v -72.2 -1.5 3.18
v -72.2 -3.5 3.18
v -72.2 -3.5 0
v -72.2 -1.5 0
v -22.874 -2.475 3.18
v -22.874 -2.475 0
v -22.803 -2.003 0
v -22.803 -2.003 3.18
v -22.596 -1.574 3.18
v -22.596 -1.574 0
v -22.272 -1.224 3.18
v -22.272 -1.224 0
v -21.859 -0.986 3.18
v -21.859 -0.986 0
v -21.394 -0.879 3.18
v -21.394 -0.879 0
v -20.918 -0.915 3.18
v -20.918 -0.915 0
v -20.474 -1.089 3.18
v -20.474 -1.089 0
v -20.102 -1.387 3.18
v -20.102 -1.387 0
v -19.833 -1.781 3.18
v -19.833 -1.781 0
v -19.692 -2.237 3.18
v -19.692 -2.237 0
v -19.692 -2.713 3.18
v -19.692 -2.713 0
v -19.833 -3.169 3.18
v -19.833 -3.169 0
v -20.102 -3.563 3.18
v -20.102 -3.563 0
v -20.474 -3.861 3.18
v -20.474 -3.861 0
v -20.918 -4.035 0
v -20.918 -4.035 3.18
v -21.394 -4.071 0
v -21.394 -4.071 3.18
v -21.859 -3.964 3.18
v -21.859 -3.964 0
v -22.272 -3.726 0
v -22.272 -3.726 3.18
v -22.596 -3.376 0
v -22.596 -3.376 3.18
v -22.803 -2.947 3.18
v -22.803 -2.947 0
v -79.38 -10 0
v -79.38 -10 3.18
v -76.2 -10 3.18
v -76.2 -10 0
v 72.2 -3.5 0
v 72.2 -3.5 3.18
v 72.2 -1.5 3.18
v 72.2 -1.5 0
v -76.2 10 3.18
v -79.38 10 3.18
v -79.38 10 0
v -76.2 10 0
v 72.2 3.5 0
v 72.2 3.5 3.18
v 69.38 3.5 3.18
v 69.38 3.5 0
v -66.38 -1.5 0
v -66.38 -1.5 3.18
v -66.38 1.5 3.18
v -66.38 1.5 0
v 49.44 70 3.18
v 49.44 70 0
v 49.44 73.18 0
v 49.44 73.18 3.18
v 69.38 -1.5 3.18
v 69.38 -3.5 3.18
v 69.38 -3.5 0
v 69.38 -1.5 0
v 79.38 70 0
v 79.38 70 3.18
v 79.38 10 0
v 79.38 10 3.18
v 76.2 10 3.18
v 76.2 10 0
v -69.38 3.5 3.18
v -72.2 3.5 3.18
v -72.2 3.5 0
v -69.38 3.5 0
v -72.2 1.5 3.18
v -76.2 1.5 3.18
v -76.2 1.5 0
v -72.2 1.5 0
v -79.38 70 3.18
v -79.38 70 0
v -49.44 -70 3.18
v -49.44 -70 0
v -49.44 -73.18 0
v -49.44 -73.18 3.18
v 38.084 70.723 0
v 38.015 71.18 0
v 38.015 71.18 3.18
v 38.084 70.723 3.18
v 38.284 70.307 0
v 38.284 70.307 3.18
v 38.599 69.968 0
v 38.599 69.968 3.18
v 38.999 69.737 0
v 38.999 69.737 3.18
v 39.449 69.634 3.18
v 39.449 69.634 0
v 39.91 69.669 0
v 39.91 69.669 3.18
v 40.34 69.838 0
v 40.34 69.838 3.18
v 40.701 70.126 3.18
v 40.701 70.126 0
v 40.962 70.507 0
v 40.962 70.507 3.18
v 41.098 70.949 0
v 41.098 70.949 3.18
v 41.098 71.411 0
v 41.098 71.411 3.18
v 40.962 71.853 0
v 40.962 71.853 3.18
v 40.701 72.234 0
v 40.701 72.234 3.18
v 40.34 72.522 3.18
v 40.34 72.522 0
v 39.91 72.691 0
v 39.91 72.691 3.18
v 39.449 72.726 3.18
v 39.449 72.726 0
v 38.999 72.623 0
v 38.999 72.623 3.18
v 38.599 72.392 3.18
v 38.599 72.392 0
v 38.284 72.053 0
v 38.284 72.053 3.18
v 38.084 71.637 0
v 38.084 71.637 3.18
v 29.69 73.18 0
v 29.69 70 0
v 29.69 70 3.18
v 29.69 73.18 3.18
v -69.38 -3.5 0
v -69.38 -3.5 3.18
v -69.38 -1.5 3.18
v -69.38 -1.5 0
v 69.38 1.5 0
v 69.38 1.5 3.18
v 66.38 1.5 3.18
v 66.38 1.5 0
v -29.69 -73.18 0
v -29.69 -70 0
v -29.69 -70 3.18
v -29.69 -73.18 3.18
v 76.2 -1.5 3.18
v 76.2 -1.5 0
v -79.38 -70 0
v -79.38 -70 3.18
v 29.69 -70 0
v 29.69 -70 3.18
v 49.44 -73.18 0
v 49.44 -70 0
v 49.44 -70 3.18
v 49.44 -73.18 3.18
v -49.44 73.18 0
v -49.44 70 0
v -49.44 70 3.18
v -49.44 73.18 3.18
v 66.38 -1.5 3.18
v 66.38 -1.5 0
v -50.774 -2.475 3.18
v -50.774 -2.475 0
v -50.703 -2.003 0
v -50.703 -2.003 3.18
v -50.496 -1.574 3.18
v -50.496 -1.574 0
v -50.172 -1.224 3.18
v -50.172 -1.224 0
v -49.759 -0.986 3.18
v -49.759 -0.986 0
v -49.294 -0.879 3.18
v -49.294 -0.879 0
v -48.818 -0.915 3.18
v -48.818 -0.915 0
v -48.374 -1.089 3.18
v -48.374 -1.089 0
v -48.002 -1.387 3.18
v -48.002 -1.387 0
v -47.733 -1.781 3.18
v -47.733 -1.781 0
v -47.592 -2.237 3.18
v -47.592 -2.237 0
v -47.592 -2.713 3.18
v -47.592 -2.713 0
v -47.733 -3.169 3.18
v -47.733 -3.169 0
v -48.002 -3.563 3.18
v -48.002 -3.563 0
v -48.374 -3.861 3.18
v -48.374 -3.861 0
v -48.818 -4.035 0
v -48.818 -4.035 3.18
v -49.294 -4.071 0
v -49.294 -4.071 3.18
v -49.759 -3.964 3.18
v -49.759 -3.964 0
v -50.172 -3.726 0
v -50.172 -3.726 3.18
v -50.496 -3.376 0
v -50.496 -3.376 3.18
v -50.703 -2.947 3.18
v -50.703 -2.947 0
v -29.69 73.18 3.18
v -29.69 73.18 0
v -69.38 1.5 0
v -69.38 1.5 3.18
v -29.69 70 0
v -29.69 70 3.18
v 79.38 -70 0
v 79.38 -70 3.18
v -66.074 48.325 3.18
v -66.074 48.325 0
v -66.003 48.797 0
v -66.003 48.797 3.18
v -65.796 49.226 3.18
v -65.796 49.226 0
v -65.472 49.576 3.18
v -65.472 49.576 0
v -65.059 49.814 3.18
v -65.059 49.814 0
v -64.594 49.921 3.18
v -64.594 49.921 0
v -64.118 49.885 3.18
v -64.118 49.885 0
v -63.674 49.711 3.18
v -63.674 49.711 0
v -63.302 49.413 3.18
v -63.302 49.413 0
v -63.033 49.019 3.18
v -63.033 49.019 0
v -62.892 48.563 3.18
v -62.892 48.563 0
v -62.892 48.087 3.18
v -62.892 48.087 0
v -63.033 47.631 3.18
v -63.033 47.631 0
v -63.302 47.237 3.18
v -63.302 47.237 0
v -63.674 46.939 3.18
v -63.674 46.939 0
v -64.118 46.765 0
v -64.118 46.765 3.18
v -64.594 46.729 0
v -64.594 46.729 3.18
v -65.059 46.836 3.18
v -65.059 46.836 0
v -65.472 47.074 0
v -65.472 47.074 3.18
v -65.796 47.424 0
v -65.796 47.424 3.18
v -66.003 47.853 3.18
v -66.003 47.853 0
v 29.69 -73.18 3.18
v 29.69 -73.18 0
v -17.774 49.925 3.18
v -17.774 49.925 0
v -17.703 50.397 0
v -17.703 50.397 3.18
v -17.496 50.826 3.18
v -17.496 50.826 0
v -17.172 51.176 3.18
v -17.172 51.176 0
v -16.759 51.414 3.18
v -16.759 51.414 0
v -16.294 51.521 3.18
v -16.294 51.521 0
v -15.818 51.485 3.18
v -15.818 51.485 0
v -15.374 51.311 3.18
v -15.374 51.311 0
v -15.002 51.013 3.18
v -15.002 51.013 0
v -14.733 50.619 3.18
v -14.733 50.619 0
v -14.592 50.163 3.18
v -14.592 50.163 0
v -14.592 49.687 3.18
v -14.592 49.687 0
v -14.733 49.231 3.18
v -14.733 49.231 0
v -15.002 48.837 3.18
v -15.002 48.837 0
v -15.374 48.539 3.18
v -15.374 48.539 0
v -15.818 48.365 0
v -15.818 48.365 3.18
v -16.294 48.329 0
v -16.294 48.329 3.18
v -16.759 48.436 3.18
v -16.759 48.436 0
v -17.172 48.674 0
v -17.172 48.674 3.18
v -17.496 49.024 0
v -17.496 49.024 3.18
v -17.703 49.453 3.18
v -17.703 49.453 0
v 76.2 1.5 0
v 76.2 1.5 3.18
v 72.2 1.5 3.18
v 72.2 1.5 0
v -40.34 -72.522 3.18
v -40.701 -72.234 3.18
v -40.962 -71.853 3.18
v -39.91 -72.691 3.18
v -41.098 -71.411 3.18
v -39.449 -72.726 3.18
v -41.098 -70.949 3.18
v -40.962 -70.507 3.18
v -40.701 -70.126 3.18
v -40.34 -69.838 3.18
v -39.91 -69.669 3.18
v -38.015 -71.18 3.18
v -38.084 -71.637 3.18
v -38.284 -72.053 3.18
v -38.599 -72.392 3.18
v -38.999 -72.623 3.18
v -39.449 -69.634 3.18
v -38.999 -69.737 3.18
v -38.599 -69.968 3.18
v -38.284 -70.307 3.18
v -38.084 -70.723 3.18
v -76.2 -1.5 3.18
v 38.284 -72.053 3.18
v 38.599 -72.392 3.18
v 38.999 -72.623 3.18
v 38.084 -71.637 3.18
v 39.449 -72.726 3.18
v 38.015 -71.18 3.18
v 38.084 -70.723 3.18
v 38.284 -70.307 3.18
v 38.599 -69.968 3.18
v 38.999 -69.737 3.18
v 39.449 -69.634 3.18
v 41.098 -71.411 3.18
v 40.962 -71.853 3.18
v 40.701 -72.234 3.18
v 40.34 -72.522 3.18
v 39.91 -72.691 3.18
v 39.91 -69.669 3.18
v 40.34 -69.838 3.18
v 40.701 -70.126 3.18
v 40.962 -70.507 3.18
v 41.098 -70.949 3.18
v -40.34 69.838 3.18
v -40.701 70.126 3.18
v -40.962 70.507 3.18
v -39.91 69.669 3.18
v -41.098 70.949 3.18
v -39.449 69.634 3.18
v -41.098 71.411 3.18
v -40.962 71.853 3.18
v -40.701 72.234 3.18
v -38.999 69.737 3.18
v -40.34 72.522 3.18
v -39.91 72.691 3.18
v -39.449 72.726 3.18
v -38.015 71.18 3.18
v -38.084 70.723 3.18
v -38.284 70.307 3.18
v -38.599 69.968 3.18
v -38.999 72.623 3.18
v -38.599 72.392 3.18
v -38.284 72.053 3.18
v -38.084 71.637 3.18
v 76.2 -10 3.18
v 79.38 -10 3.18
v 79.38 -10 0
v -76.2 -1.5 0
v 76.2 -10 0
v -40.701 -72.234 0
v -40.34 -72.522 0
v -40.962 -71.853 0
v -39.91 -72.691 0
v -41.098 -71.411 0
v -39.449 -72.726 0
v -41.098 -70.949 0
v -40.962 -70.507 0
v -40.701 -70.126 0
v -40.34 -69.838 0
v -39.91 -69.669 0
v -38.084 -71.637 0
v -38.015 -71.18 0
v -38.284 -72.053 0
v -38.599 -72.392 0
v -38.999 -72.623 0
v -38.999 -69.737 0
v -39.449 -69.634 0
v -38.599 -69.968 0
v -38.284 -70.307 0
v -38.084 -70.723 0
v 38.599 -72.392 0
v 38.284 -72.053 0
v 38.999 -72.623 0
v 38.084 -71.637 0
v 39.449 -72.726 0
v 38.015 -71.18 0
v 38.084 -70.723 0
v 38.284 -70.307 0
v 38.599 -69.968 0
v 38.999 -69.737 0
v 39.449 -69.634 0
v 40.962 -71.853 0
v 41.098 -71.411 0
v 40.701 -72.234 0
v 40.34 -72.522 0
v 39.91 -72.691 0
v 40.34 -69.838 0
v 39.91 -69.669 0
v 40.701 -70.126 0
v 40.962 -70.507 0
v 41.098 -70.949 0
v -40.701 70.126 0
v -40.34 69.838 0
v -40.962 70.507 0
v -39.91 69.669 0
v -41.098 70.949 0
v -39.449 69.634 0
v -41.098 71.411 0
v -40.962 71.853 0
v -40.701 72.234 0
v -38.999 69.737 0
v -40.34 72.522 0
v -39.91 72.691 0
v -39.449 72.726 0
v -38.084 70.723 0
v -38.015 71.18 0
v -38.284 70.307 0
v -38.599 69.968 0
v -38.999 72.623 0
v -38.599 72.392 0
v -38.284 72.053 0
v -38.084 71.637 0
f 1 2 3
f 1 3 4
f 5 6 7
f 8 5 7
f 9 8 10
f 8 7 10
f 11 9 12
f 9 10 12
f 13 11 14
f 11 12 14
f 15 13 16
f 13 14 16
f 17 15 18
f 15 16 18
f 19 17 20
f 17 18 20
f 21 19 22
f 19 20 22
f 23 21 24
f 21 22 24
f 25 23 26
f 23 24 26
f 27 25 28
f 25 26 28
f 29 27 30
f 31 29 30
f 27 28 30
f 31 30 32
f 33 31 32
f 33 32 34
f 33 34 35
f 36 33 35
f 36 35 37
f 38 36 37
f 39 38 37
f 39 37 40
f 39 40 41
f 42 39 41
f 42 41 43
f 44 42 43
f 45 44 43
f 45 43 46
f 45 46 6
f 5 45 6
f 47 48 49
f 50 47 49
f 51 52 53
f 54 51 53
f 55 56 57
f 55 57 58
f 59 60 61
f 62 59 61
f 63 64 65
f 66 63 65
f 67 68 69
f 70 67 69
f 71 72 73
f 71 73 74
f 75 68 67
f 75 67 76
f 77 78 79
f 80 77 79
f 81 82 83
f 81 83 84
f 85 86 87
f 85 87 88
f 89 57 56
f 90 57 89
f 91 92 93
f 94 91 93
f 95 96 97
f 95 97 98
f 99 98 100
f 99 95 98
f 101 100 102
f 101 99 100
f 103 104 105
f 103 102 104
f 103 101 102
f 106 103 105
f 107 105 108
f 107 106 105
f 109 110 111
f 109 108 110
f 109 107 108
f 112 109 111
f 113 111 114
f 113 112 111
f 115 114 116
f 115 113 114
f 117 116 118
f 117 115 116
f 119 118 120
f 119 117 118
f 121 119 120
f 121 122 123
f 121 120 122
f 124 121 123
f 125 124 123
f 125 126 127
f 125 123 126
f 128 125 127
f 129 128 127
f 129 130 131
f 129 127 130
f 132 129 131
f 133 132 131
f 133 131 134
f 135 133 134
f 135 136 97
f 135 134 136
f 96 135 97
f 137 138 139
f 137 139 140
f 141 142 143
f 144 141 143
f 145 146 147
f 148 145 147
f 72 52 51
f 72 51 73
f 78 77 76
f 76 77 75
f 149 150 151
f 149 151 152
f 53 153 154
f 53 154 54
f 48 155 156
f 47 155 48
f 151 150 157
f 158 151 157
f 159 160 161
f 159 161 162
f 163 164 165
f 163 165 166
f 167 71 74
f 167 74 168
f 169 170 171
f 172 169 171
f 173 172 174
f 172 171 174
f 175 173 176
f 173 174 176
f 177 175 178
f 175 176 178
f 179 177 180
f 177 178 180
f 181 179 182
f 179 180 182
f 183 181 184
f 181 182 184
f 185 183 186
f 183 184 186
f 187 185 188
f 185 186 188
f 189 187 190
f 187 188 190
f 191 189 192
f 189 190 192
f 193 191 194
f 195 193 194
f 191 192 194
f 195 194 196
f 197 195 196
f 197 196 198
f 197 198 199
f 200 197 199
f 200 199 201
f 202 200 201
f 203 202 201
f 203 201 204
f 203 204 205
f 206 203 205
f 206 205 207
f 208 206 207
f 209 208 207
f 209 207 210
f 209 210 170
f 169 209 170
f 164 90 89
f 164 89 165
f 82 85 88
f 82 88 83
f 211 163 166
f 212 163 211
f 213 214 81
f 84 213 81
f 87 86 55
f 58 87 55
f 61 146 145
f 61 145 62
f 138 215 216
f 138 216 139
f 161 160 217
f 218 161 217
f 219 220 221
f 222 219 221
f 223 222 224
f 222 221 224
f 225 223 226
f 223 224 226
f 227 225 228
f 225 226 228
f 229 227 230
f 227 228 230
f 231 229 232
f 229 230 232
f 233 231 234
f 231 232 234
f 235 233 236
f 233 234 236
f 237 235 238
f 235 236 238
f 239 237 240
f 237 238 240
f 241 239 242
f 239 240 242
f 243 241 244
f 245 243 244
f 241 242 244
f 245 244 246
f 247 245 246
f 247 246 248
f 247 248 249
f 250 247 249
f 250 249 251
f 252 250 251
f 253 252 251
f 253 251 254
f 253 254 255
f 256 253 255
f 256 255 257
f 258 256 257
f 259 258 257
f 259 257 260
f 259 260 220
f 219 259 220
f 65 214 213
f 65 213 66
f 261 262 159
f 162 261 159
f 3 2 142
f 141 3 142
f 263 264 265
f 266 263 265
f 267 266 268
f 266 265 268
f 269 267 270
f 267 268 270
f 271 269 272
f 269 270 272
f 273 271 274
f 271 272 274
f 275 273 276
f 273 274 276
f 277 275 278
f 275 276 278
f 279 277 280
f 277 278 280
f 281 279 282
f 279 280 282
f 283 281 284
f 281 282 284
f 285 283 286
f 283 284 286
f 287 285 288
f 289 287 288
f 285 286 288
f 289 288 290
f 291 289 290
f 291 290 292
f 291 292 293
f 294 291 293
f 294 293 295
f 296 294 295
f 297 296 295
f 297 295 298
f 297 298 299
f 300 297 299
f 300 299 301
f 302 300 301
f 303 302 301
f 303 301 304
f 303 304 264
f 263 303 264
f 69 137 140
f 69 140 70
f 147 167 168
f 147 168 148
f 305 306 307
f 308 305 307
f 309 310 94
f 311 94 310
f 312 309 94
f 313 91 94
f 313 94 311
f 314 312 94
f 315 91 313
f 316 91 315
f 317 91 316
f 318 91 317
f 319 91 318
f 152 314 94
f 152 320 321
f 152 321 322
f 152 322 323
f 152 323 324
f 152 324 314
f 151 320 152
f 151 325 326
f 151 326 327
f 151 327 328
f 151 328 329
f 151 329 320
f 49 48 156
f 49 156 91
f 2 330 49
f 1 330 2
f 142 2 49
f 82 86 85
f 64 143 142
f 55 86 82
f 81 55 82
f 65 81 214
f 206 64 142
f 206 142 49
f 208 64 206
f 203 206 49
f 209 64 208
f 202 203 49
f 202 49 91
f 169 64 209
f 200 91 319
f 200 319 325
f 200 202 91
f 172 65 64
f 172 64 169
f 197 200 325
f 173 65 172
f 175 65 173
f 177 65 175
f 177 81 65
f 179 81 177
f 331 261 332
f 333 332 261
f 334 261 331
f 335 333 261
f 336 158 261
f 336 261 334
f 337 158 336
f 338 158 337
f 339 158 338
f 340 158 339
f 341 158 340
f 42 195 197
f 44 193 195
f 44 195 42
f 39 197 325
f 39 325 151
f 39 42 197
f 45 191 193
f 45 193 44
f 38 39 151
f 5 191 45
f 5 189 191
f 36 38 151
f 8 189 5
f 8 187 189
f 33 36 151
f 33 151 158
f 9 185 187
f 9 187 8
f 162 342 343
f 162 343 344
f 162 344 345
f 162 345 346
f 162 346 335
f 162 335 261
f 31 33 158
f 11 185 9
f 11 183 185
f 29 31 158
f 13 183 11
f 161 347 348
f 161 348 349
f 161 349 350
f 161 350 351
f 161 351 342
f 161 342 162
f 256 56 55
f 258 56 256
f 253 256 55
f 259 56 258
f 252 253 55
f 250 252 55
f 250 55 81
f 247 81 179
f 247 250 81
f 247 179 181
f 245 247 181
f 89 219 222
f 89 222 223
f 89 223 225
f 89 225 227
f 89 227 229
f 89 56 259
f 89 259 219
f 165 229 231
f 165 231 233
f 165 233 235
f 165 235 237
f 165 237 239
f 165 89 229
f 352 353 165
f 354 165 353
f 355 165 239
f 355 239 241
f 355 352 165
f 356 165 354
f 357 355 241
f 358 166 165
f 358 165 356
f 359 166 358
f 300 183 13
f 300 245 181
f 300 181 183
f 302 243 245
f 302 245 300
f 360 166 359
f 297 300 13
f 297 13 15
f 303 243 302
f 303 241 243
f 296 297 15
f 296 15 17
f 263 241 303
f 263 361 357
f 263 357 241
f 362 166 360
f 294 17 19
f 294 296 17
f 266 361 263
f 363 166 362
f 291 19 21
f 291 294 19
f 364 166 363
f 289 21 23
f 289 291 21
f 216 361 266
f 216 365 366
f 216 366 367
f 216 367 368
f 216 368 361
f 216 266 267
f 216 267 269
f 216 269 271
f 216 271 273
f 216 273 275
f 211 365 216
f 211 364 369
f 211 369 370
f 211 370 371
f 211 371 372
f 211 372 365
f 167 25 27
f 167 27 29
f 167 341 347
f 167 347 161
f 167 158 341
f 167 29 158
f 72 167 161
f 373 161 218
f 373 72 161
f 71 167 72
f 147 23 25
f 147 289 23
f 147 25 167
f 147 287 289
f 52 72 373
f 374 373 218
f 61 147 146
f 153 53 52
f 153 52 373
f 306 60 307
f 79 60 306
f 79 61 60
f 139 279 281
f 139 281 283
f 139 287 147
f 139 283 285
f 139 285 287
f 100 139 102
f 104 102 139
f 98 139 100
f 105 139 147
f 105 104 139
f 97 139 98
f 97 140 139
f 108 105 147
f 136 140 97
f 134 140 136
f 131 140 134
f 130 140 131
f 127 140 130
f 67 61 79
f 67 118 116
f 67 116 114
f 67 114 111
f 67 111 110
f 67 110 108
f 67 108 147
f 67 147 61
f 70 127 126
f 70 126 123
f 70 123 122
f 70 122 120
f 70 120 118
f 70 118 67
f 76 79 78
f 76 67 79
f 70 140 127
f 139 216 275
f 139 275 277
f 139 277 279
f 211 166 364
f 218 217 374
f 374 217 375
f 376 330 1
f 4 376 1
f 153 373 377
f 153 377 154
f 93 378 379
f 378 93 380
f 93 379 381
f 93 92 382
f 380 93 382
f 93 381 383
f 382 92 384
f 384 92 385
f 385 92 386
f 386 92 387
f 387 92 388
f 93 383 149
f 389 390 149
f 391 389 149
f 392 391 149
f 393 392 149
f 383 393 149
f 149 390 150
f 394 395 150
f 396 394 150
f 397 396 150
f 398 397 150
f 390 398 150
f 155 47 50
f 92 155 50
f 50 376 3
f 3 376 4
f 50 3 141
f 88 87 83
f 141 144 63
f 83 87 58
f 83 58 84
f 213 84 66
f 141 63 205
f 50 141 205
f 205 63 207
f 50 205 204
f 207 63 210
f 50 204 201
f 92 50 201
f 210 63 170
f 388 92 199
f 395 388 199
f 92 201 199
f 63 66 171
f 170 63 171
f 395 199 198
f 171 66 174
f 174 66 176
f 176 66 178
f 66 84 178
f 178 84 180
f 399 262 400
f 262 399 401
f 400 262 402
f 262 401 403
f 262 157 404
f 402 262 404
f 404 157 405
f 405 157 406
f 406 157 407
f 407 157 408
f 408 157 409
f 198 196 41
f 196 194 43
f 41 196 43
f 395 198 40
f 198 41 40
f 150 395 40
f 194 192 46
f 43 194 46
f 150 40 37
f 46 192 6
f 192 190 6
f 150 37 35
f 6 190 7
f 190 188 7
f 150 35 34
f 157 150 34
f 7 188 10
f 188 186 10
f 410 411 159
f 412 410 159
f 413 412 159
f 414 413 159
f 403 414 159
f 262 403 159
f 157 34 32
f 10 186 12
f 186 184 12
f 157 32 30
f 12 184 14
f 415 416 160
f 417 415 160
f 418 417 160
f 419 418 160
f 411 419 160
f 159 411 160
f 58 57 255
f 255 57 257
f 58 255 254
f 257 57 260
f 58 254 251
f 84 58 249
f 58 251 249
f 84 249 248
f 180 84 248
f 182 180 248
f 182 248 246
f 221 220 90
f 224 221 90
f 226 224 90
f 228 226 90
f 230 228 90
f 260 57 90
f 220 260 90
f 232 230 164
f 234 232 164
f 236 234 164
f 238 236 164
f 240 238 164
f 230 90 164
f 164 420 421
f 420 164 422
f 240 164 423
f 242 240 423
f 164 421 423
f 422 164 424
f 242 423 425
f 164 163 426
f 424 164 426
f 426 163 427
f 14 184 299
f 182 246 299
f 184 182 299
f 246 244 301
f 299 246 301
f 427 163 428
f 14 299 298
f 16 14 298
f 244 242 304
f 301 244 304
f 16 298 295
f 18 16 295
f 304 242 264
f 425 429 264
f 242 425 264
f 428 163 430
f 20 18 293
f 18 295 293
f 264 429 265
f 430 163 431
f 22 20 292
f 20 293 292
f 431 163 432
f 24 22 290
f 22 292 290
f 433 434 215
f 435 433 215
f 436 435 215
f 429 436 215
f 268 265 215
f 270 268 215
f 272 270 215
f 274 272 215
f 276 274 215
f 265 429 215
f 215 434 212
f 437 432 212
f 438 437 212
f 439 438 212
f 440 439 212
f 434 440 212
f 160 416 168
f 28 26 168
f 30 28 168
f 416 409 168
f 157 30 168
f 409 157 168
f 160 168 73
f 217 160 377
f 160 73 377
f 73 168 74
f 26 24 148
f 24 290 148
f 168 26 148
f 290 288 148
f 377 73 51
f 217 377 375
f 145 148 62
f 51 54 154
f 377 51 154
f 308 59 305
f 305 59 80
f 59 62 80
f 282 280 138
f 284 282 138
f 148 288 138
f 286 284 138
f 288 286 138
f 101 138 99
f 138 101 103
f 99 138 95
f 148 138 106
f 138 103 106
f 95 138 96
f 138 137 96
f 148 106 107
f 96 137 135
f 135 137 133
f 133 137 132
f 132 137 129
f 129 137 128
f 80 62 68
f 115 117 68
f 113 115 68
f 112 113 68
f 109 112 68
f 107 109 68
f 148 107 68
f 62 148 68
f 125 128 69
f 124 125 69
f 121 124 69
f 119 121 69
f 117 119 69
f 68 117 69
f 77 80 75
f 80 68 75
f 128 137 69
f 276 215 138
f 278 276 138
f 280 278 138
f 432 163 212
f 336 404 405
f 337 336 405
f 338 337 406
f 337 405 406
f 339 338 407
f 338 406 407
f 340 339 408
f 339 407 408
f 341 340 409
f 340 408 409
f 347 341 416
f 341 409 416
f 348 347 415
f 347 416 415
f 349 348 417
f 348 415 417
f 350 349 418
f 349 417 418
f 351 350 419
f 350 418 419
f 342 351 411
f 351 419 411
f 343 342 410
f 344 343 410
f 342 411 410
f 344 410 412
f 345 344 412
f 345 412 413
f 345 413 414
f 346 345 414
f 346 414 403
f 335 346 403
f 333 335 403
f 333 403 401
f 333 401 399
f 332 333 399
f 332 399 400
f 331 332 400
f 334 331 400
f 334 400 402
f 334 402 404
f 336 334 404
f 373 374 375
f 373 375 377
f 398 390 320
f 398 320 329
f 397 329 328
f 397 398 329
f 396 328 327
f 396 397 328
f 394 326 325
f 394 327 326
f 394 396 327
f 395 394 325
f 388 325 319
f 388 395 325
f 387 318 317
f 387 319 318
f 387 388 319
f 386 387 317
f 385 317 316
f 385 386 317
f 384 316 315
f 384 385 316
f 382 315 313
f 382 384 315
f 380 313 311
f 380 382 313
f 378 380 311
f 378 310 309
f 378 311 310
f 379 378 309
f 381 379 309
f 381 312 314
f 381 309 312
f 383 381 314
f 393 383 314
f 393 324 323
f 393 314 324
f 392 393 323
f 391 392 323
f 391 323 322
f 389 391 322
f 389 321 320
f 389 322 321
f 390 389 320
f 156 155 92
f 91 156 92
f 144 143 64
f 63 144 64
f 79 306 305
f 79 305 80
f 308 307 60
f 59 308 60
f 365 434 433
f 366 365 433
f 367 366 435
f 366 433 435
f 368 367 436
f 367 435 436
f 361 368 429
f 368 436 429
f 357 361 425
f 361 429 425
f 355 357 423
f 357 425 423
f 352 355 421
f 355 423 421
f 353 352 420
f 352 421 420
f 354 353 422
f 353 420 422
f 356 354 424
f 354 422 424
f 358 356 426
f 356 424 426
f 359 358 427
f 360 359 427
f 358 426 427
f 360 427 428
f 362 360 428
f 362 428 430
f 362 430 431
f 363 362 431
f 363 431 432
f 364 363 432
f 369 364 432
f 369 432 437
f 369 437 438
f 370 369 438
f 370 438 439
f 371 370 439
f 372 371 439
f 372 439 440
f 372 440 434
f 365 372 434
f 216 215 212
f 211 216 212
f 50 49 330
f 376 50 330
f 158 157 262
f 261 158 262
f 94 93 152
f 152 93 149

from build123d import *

# Parameters (mm, degrees)
SKETCH1_W               = 158.76
SKETCH1_H               = 146.36
BOSS_EXTRUDE1_DEPTH     = 3.18
CUT_EXTRUDE1_START      = -4.18
SKETCH2_W               = 29.94
SKETCH2_H               = 3.18
SKETCH2_W_2             = 59.38
CUT_EXTRUDE1_DEPTH      = 5.18
CUT_EXTRUDE2_START      = -4.18
SKETCH3_R               = 1.55
CUT_EXTRUDE2_DEPTH      = 5.18
MIRROR3_START           = -4.18
MIRROR3_COPY_1_SKETCH_R = 1.55
MIRROR3_COPY_1_DEPTH    = 5.18
CUT_EXTRUDE3_START      = -4.18
SKETCH5_W               = 3.18
SKETCH5_H               = 20
SKETCH5_W_2             = 2.82
SKETCH5_H_2             = 7
SKETCH5_W_3             = 13
SKETCH5_H_3             = 3
CUT_EXTRUDE3_DEPTH      = 5.18
SKETCH7_R               = 1.6
CUT_EXTRUDE4_DEPTH      = 1
CUT_EXTRUDE4_DEPTH_BACK = 4.18


with BuildPart() as part:
    # Sketch1 → Boss-Extrude1 (new body)
    with BuildSketch(Plane.XY):
        Rectangle(SKETCH1_W, SKETCH1_H)
    extrude(amount=BOSS_EXTRUDE1_DEPTH)

    # Sketch2 → Cut-Extrude1 (cut)
    with BuildSketch(Plane.XY.offset(3.18).offset(CUT_EXTRUDE1_START)):
        with Locations((-64.41, 71.59)):
            Rectangle(SKETCH2_W, SKETCH2_H)
        with Locations((0, 71.59)):
            Rectangle(SKETCH2_W_2, SKETCH2_H)
        with Locations((64.41, 71.59)):
            Rectangle(SKETCH2_W, SKETCH2_H)
    cut_extrude1 = extrude(amount=CUT_EXTRUDE1_DEPTH, mode=Mode.SUBTRACT)

    # Mirror1: Cut-Extrude1 across plane
    add(cut_extrude1.mirror(Plane.ZX), mode=Mode.SUBTRACT)

    # Sketch3 → Cut-Extrude2 (cut)
    with BuildSketch(Plane.XY.offset(3.18).offset(CUT_EXTRUDE2_START)):
        with Locations((-39.565, -71.18)):
            Circle(SKETCH3_R)
    cut_extrude2 = extrude(amount=CUT_EXTRUDE2_DEPTH, mode=Mode.SUBTRACT)

    # Mirror2: Cut-Extrude2 across plane
    add(cut_extrude2.mirror(Plane(origin=(0, 0, 0), x_dir=(0, 0, 1), z_dir=(1, 0, 0))), mode=Mode.SUBTRACT)

    # Mirror3: Cut-Extrude2 across plane
    add(cut_extrude2.mirror(Plane.ZX), mode=Mode.SUBTRACT)

    # Mirror3 copy 1 sketch → Mirror3 copy 1 (cut)
    with BuildSketch(Plane(origin=(0, 0, 3.18), x_dir=(-1, 0, 0), z_dir=(0, 0, 1)).offset(MIRROR3_START)):
        with Locations((-39.565, -71.18)):
            Circle(MIRROR3_COPY_1_SKETCH_R)
    extrude(amount=MIRROR3_COPY_1_DEPTH, mode=Mode.SUBTRACT)

    # Sketch5 → Cut-Extrude3 (cut)
    with BuildSketch(Plane(origin=(0, 0, 0), x_dir=(-1, 0, 0), z_dir=(0, 0, -1)).offset(CUT_EXTRUDE3_START)):
        with Locations((-77.79, 0)):
            Rectangle(SKETCH5_W, SKETCH5_H)
        with Locations((-70.79, 0)):
            Rectangle(SKETCH5_W_2, SKETCH5_H_2)
        with Locations((-72.88, 0)):
            Rectangle(SKETCH5_W_3, SKETCH5_H_3)
    cut_extrude3 = extrude(amount=CUT_EXTRUDE3_DEPTH, mode=Mode.SUBTRACT)

    # Mirror4: Cut-Extrude3 across plane
    add(cut_extrude3.mirror(Plane(origin=(0, 0, 0), x_dir=(0, 0, 1), z_dir=(1, 0, 0))), mode=Mode.SUBTRACT)

    # Sketch7 → Cut-Extrude4 (cut, two sides)
    with BuildSketch(Plane(origin=(0, 0, 0), x_dir=(-1, 0, 0), z_dir=(0, 0, -1))) as cut_extrude4_sk:
        with Locations((64.474463585, 48.325)):
            Circle(SKETCH7_R)
        with Locations((16.174463585, 49.925)):
            Circle(SKETCH7_R)
        with Locations((49.174463585, -2.475)):
            Circle(SKETCH7_R)
        with Locations((21.274463585, -2.475)):
            Circle(SKETCH7_R)
    extrude(amount=CUT_EXTRUDE4_DEPTH, mode=Mode.SUBTRACT)
    extrude(cut_extrude4_sk.sketch, amount=-CUT_EXTRUDE4_DEPTH_BACK, mode=Mode.SUBTRACT)


solid = part.part
